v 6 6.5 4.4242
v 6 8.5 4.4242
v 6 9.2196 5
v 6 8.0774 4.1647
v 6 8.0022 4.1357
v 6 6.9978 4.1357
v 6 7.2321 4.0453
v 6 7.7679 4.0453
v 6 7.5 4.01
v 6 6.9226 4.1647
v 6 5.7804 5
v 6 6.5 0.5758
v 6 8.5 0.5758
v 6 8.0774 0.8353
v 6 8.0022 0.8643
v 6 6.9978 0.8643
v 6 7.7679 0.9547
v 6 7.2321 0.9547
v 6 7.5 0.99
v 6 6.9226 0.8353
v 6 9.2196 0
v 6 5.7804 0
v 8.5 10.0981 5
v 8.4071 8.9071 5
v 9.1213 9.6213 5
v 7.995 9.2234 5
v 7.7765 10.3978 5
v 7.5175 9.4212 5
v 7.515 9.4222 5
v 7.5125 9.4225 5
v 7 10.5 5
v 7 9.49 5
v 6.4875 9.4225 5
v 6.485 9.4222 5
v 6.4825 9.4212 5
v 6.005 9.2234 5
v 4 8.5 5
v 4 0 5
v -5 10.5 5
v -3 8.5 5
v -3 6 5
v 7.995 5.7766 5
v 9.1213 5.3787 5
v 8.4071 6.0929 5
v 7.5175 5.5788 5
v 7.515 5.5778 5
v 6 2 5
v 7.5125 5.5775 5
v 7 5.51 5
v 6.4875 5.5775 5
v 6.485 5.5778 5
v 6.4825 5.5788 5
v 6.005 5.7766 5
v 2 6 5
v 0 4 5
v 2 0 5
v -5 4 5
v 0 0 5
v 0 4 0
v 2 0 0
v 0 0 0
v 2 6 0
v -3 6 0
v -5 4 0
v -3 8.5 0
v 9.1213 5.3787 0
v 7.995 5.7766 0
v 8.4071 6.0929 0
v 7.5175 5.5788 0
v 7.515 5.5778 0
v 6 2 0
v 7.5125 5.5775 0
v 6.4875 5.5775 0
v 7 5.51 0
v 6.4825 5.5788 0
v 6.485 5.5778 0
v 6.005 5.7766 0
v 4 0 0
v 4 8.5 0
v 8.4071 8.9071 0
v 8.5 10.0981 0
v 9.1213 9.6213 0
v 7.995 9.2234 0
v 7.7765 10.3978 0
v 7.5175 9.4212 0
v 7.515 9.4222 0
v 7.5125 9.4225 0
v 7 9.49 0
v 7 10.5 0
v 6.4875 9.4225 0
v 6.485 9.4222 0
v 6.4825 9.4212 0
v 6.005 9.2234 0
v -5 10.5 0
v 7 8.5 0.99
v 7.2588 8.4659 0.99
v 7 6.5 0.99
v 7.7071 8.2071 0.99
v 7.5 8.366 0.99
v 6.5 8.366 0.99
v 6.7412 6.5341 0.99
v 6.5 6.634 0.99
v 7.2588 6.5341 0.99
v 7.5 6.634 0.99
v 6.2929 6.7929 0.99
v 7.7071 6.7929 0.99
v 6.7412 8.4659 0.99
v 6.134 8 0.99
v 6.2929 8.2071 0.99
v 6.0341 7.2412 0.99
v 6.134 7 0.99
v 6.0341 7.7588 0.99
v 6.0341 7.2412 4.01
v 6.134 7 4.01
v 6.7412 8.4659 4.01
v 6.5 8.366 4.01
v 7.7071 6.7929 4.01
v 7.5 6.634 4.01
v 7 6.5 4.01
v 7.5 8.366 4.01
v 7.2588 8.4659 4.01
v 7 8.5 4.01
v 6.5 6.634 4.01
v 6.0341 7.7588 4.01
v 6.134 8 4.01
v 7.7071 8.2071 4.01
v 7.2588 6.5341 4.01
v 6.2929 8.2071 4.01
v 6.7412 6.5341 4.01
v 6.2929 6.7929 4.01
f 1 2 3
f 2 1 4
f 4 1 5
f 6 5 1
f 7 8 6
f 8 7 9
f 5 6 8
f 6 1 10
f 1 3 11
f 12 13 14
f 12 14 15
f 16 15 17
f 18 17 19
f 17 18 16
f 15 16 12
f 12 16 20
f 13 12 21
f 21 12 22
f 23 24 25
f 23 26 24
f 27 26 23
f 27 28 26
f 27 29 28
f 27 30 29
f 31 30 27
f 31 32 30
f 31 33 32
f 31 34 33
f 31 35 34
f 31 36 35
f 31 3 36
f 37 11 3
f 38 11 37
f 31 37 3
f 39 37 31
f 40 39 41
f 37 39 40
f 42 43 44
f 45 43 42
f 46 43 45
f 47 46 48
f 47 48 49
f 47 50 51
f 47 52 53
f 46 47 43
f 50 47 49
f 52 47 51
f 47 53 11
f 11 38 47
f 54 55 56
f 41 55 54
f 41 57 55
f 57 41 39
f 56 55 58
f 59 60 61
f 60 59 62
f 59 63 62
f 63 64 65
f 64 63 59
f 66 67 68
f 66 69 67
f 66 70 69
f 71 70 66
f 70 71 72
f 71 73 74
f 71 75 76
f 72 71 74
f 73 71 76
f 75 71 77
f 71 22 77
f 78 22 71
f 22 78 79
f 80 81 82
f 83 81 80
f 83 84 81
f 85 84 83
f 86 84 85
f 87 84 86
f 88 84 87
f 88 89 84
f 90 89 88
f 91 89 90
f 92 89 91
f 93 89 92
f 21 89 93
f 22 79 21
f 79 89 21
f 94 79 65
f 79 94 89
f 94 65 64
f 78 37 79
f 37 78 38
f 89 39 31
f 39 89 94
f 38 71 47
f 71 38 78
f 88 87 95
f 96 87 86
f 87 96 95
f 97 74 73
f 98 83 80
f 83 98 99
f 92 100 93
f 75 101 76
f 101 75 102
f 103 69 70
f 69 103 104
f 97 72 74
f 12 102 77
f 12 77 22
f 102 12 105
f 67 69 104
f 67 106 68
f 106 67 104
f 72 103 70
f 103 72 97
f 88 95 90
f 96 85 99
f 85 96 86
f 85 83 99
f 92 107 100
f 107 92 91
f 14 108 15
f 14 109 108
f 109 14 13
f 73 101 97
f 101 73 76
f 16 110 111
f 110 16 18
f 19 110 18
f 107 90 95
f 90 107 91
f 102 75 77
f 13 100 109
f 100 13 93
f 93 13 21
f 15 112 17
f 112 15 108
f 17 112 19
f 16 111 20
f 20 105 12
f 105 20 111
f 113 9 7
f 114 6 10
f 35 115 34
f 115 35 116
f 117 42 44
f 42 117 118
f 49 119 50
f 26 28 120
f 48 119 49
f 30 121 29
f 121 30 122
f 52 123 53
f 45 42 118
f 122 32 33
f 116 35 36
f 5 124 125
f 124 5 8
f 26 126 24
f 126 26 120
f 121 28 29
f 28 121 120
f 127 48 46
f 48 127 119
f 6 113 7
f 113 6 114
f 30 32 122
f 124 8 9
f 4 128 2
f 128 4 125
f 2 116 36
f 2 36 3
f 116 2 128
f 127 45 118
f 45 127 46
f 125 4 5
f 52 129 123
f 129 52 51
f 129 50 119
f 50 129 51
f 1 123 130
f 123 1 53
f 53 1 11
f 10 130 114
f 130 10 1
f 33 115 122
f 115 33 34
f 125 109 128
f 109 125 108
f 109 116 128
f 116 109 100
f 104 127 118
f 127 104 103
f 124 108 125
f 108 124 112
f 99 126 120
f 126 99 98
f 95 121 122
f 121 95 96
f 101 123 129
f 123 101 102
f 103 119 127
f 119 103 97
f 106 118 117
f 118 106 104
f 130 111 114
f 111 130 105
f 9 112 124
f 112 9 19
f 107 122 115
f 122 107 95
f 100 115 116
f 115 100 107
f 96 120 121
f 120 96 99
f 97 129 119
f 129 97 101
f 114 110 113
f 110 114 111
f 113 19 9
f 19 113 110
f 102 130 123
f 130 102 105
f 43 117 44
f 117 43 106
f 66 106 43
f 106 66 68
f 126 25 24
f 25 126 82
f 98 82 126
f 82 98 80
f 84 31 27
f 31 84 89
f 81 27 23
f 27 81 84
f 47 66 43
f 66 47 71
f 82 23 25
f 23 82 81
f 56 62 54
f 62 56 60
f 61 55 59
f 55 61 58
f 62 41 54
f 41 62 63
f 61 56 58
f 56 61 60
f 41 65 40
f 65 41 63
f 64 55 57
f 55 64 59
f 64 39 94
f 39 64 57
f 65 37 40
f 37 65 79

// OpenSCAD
// file: filament_jaw.scad
$fn = 24;

default_filament_diameter = 1.75 + 0.1;
default_extrude_depth = 4;
default_shell_thickness = 2;
default_bevel_radius = 1;

filament_jaw();

module filament_jaw(
    filament_diameter = default_filament_diameter,
    extrude_depth = default_extrude_depth,
    shell_thickness = default_shell_thickness,
    bevel_radius = default_bevel_radius,
    wall_size = 10)
{
    filament_jaw_od = filament_diameter + (shell_thickness * 2);
    filament_jaw_or = filament_jaw_od / 2; 
    filament_jaw_id = filament_diameter;
    filament_jaw_ir = filament_jaw_id / 2;

    translate([filament_jaw_or, wall_size - filament_jaw_or, 0])
    difference()
    {
        body();
        hole();
    }

    module body()
    {
        hull()
        {
            translate([
                -filament_jaw_or,
                filament_jaw_or - wall_size,
                0])
            cube([
                shell_thickness,
                wall_size,
                extrude_depth]);

            cylinder(
                r = filament_jaw_or, 
                h = extrude_depth);
        }
        
    }

    module hole()
    {
        translate([0, 0, -0.01])
        cylinder(
            r1 = filament_jaw_ir + bevel_radius,
            r2 = filament_jaw_ir, 
            h = bevel_radius);

        translate([0, 0, extrude_depth - bevel_radius + 0.01])
        cylinder(
            r1 = filament_jaw_ir,
            r2 = filament_jaw_ir  + bevel_radius, 
            h = bevel_radius);

        translate([0, 0, -1])
        cylinder(
            r = filament_jaw_ir, 
            h = extrude_depth + 2);

        rotate(180,0,0)
        translate([-filament_jaw_or, 0, -1])        
        cylinder(
            r = filament_jaw_or, 
            h = extrude_depth + 2,
            $fn = 4);
    }
}
// file: spool_clip.scad
use <filament_jaw.scad>;

default_filament_diameter = 2.0;
default_extrude_depth = 4;
default_shell_thickness = 2;

// going clockwise looking at the clip, with the filament jaw on the right
default_segment_1 = 5;
default_segment_2 = 5;
default_segment_3 = 5;
default_segment_4 = 5;

spool_clip();

module spool_clip(
    filament_diameter = default_filament_diameter,
    extrude_depth = default_extrude_depth,
    shell_thickness = default_shell_thickness,    
    segment_1 = default_segment_1,
    segment_2 = default_segment_2,
    segment_3 = default_segment_3,
    segment_4 = default_segment_4
)
{
    union()
    {
        draw_segment_1();    
        draw_segment_2();    
        draw_segment_3();    
        draw_segment_4();    
        draw_segment_5();    
        draw_filament_jaw();
    }
    
    module draw_segment_1()
    {
        //color([1,0,0])
        cube([
            shell_thickness, 
            segment_1, 
            extrude_depth]);
    }
    
    module draw_segment_2()
    {
        //color([0,1,0])
        translate([
            shell_thickness - segment_2, 
            segment_1 - shell_thickness, 
            0])
        cube([
            segment_2, 
            shell_thickness, 
            extrude_depth]);
    }
    
    module draw_segment_3()
    {
        //color([0,0,1])
        translate([
            -(segment_2), 
            segment_1 - shell_thickness, 
            0])
        cube([
            shell_thickness, 
            segment_3 + shell_thickness, 
            extrude_depth]);
    }
    
    module draw_segment_4()
    {
        //color([1,1,0])
        translate([
            -(segment_2), 
            segment_1 + segment_3, 
            0])
        cube([
            segment_4 + segment_2 + shell_thickness,
            shell_thickness,  
            extrude_depth]);
    }
    
    module draw_segment_5()
    {
        //color([0,1,1])
        translate([
            segment_4 + shell_thickness, 
            0, 
            0])
        difference()
        {
            cube([
                shell_thickness, 
                segment_1 + segment_3 + shell_thickness, 
                extrude_depth]);

            rotate(-45)
            translate([
                0,
                0,
                -1
            ])
            cube([
                shell_thickness * 2, 
                shell_thickness * 2, 
                extrude_depth + 2]);            
        }
    }    

    module draw_filament_jaw()
    {
        diameter = filament_diameter + (shell_thickness * 2);
        radius = diameter / 2;

        //color([1,0,1])
        translate([
            segment_4 + shell_thickness, 
            shell_thickness, 
            0])
        filament_jaw(
            filament_diameter = filament_diameter,
            shell_thickness = shell_thickness,
            extrude_depth = extrude_depth,
            wall_size = segment_1 + segment_3);
    }
}
// main file
use <spool_clip.scad>;

default_filament_diameter = 2.0;
default_extrude_depth = 5;
default_shell_thickness = 2;

// going clockwise looking at the clip, with the filament jaw on the right
default_segment_1 = 6;
default_segment_2 = 5.0;
default_segment_3 = 2.5;
default_segment_4 = 2.0;

spool_clip_monoprice();

module spool_clip_monoprice(
    filament_diameter = default_filament_diameter,
    extrude_depth = default_extrude_depth,
    shell_thickness = default_shell_thickness,
    segment_1 = default_segment_1,
    segment_2 = default_segment_2,
    segment_3 = default_segment_3,
    segment_4 = default_segment_4
)
{
    spool_clip(
        filament_diameter = filament_diameter,
        extrude_depth = extrude_depth,
        shell_thickness = shell_thickness,
        segment_1 = segment_1,
        segment_2 = segment_2,
        segment_3 = segment_3,
        segment_4 = segment_4);
}
